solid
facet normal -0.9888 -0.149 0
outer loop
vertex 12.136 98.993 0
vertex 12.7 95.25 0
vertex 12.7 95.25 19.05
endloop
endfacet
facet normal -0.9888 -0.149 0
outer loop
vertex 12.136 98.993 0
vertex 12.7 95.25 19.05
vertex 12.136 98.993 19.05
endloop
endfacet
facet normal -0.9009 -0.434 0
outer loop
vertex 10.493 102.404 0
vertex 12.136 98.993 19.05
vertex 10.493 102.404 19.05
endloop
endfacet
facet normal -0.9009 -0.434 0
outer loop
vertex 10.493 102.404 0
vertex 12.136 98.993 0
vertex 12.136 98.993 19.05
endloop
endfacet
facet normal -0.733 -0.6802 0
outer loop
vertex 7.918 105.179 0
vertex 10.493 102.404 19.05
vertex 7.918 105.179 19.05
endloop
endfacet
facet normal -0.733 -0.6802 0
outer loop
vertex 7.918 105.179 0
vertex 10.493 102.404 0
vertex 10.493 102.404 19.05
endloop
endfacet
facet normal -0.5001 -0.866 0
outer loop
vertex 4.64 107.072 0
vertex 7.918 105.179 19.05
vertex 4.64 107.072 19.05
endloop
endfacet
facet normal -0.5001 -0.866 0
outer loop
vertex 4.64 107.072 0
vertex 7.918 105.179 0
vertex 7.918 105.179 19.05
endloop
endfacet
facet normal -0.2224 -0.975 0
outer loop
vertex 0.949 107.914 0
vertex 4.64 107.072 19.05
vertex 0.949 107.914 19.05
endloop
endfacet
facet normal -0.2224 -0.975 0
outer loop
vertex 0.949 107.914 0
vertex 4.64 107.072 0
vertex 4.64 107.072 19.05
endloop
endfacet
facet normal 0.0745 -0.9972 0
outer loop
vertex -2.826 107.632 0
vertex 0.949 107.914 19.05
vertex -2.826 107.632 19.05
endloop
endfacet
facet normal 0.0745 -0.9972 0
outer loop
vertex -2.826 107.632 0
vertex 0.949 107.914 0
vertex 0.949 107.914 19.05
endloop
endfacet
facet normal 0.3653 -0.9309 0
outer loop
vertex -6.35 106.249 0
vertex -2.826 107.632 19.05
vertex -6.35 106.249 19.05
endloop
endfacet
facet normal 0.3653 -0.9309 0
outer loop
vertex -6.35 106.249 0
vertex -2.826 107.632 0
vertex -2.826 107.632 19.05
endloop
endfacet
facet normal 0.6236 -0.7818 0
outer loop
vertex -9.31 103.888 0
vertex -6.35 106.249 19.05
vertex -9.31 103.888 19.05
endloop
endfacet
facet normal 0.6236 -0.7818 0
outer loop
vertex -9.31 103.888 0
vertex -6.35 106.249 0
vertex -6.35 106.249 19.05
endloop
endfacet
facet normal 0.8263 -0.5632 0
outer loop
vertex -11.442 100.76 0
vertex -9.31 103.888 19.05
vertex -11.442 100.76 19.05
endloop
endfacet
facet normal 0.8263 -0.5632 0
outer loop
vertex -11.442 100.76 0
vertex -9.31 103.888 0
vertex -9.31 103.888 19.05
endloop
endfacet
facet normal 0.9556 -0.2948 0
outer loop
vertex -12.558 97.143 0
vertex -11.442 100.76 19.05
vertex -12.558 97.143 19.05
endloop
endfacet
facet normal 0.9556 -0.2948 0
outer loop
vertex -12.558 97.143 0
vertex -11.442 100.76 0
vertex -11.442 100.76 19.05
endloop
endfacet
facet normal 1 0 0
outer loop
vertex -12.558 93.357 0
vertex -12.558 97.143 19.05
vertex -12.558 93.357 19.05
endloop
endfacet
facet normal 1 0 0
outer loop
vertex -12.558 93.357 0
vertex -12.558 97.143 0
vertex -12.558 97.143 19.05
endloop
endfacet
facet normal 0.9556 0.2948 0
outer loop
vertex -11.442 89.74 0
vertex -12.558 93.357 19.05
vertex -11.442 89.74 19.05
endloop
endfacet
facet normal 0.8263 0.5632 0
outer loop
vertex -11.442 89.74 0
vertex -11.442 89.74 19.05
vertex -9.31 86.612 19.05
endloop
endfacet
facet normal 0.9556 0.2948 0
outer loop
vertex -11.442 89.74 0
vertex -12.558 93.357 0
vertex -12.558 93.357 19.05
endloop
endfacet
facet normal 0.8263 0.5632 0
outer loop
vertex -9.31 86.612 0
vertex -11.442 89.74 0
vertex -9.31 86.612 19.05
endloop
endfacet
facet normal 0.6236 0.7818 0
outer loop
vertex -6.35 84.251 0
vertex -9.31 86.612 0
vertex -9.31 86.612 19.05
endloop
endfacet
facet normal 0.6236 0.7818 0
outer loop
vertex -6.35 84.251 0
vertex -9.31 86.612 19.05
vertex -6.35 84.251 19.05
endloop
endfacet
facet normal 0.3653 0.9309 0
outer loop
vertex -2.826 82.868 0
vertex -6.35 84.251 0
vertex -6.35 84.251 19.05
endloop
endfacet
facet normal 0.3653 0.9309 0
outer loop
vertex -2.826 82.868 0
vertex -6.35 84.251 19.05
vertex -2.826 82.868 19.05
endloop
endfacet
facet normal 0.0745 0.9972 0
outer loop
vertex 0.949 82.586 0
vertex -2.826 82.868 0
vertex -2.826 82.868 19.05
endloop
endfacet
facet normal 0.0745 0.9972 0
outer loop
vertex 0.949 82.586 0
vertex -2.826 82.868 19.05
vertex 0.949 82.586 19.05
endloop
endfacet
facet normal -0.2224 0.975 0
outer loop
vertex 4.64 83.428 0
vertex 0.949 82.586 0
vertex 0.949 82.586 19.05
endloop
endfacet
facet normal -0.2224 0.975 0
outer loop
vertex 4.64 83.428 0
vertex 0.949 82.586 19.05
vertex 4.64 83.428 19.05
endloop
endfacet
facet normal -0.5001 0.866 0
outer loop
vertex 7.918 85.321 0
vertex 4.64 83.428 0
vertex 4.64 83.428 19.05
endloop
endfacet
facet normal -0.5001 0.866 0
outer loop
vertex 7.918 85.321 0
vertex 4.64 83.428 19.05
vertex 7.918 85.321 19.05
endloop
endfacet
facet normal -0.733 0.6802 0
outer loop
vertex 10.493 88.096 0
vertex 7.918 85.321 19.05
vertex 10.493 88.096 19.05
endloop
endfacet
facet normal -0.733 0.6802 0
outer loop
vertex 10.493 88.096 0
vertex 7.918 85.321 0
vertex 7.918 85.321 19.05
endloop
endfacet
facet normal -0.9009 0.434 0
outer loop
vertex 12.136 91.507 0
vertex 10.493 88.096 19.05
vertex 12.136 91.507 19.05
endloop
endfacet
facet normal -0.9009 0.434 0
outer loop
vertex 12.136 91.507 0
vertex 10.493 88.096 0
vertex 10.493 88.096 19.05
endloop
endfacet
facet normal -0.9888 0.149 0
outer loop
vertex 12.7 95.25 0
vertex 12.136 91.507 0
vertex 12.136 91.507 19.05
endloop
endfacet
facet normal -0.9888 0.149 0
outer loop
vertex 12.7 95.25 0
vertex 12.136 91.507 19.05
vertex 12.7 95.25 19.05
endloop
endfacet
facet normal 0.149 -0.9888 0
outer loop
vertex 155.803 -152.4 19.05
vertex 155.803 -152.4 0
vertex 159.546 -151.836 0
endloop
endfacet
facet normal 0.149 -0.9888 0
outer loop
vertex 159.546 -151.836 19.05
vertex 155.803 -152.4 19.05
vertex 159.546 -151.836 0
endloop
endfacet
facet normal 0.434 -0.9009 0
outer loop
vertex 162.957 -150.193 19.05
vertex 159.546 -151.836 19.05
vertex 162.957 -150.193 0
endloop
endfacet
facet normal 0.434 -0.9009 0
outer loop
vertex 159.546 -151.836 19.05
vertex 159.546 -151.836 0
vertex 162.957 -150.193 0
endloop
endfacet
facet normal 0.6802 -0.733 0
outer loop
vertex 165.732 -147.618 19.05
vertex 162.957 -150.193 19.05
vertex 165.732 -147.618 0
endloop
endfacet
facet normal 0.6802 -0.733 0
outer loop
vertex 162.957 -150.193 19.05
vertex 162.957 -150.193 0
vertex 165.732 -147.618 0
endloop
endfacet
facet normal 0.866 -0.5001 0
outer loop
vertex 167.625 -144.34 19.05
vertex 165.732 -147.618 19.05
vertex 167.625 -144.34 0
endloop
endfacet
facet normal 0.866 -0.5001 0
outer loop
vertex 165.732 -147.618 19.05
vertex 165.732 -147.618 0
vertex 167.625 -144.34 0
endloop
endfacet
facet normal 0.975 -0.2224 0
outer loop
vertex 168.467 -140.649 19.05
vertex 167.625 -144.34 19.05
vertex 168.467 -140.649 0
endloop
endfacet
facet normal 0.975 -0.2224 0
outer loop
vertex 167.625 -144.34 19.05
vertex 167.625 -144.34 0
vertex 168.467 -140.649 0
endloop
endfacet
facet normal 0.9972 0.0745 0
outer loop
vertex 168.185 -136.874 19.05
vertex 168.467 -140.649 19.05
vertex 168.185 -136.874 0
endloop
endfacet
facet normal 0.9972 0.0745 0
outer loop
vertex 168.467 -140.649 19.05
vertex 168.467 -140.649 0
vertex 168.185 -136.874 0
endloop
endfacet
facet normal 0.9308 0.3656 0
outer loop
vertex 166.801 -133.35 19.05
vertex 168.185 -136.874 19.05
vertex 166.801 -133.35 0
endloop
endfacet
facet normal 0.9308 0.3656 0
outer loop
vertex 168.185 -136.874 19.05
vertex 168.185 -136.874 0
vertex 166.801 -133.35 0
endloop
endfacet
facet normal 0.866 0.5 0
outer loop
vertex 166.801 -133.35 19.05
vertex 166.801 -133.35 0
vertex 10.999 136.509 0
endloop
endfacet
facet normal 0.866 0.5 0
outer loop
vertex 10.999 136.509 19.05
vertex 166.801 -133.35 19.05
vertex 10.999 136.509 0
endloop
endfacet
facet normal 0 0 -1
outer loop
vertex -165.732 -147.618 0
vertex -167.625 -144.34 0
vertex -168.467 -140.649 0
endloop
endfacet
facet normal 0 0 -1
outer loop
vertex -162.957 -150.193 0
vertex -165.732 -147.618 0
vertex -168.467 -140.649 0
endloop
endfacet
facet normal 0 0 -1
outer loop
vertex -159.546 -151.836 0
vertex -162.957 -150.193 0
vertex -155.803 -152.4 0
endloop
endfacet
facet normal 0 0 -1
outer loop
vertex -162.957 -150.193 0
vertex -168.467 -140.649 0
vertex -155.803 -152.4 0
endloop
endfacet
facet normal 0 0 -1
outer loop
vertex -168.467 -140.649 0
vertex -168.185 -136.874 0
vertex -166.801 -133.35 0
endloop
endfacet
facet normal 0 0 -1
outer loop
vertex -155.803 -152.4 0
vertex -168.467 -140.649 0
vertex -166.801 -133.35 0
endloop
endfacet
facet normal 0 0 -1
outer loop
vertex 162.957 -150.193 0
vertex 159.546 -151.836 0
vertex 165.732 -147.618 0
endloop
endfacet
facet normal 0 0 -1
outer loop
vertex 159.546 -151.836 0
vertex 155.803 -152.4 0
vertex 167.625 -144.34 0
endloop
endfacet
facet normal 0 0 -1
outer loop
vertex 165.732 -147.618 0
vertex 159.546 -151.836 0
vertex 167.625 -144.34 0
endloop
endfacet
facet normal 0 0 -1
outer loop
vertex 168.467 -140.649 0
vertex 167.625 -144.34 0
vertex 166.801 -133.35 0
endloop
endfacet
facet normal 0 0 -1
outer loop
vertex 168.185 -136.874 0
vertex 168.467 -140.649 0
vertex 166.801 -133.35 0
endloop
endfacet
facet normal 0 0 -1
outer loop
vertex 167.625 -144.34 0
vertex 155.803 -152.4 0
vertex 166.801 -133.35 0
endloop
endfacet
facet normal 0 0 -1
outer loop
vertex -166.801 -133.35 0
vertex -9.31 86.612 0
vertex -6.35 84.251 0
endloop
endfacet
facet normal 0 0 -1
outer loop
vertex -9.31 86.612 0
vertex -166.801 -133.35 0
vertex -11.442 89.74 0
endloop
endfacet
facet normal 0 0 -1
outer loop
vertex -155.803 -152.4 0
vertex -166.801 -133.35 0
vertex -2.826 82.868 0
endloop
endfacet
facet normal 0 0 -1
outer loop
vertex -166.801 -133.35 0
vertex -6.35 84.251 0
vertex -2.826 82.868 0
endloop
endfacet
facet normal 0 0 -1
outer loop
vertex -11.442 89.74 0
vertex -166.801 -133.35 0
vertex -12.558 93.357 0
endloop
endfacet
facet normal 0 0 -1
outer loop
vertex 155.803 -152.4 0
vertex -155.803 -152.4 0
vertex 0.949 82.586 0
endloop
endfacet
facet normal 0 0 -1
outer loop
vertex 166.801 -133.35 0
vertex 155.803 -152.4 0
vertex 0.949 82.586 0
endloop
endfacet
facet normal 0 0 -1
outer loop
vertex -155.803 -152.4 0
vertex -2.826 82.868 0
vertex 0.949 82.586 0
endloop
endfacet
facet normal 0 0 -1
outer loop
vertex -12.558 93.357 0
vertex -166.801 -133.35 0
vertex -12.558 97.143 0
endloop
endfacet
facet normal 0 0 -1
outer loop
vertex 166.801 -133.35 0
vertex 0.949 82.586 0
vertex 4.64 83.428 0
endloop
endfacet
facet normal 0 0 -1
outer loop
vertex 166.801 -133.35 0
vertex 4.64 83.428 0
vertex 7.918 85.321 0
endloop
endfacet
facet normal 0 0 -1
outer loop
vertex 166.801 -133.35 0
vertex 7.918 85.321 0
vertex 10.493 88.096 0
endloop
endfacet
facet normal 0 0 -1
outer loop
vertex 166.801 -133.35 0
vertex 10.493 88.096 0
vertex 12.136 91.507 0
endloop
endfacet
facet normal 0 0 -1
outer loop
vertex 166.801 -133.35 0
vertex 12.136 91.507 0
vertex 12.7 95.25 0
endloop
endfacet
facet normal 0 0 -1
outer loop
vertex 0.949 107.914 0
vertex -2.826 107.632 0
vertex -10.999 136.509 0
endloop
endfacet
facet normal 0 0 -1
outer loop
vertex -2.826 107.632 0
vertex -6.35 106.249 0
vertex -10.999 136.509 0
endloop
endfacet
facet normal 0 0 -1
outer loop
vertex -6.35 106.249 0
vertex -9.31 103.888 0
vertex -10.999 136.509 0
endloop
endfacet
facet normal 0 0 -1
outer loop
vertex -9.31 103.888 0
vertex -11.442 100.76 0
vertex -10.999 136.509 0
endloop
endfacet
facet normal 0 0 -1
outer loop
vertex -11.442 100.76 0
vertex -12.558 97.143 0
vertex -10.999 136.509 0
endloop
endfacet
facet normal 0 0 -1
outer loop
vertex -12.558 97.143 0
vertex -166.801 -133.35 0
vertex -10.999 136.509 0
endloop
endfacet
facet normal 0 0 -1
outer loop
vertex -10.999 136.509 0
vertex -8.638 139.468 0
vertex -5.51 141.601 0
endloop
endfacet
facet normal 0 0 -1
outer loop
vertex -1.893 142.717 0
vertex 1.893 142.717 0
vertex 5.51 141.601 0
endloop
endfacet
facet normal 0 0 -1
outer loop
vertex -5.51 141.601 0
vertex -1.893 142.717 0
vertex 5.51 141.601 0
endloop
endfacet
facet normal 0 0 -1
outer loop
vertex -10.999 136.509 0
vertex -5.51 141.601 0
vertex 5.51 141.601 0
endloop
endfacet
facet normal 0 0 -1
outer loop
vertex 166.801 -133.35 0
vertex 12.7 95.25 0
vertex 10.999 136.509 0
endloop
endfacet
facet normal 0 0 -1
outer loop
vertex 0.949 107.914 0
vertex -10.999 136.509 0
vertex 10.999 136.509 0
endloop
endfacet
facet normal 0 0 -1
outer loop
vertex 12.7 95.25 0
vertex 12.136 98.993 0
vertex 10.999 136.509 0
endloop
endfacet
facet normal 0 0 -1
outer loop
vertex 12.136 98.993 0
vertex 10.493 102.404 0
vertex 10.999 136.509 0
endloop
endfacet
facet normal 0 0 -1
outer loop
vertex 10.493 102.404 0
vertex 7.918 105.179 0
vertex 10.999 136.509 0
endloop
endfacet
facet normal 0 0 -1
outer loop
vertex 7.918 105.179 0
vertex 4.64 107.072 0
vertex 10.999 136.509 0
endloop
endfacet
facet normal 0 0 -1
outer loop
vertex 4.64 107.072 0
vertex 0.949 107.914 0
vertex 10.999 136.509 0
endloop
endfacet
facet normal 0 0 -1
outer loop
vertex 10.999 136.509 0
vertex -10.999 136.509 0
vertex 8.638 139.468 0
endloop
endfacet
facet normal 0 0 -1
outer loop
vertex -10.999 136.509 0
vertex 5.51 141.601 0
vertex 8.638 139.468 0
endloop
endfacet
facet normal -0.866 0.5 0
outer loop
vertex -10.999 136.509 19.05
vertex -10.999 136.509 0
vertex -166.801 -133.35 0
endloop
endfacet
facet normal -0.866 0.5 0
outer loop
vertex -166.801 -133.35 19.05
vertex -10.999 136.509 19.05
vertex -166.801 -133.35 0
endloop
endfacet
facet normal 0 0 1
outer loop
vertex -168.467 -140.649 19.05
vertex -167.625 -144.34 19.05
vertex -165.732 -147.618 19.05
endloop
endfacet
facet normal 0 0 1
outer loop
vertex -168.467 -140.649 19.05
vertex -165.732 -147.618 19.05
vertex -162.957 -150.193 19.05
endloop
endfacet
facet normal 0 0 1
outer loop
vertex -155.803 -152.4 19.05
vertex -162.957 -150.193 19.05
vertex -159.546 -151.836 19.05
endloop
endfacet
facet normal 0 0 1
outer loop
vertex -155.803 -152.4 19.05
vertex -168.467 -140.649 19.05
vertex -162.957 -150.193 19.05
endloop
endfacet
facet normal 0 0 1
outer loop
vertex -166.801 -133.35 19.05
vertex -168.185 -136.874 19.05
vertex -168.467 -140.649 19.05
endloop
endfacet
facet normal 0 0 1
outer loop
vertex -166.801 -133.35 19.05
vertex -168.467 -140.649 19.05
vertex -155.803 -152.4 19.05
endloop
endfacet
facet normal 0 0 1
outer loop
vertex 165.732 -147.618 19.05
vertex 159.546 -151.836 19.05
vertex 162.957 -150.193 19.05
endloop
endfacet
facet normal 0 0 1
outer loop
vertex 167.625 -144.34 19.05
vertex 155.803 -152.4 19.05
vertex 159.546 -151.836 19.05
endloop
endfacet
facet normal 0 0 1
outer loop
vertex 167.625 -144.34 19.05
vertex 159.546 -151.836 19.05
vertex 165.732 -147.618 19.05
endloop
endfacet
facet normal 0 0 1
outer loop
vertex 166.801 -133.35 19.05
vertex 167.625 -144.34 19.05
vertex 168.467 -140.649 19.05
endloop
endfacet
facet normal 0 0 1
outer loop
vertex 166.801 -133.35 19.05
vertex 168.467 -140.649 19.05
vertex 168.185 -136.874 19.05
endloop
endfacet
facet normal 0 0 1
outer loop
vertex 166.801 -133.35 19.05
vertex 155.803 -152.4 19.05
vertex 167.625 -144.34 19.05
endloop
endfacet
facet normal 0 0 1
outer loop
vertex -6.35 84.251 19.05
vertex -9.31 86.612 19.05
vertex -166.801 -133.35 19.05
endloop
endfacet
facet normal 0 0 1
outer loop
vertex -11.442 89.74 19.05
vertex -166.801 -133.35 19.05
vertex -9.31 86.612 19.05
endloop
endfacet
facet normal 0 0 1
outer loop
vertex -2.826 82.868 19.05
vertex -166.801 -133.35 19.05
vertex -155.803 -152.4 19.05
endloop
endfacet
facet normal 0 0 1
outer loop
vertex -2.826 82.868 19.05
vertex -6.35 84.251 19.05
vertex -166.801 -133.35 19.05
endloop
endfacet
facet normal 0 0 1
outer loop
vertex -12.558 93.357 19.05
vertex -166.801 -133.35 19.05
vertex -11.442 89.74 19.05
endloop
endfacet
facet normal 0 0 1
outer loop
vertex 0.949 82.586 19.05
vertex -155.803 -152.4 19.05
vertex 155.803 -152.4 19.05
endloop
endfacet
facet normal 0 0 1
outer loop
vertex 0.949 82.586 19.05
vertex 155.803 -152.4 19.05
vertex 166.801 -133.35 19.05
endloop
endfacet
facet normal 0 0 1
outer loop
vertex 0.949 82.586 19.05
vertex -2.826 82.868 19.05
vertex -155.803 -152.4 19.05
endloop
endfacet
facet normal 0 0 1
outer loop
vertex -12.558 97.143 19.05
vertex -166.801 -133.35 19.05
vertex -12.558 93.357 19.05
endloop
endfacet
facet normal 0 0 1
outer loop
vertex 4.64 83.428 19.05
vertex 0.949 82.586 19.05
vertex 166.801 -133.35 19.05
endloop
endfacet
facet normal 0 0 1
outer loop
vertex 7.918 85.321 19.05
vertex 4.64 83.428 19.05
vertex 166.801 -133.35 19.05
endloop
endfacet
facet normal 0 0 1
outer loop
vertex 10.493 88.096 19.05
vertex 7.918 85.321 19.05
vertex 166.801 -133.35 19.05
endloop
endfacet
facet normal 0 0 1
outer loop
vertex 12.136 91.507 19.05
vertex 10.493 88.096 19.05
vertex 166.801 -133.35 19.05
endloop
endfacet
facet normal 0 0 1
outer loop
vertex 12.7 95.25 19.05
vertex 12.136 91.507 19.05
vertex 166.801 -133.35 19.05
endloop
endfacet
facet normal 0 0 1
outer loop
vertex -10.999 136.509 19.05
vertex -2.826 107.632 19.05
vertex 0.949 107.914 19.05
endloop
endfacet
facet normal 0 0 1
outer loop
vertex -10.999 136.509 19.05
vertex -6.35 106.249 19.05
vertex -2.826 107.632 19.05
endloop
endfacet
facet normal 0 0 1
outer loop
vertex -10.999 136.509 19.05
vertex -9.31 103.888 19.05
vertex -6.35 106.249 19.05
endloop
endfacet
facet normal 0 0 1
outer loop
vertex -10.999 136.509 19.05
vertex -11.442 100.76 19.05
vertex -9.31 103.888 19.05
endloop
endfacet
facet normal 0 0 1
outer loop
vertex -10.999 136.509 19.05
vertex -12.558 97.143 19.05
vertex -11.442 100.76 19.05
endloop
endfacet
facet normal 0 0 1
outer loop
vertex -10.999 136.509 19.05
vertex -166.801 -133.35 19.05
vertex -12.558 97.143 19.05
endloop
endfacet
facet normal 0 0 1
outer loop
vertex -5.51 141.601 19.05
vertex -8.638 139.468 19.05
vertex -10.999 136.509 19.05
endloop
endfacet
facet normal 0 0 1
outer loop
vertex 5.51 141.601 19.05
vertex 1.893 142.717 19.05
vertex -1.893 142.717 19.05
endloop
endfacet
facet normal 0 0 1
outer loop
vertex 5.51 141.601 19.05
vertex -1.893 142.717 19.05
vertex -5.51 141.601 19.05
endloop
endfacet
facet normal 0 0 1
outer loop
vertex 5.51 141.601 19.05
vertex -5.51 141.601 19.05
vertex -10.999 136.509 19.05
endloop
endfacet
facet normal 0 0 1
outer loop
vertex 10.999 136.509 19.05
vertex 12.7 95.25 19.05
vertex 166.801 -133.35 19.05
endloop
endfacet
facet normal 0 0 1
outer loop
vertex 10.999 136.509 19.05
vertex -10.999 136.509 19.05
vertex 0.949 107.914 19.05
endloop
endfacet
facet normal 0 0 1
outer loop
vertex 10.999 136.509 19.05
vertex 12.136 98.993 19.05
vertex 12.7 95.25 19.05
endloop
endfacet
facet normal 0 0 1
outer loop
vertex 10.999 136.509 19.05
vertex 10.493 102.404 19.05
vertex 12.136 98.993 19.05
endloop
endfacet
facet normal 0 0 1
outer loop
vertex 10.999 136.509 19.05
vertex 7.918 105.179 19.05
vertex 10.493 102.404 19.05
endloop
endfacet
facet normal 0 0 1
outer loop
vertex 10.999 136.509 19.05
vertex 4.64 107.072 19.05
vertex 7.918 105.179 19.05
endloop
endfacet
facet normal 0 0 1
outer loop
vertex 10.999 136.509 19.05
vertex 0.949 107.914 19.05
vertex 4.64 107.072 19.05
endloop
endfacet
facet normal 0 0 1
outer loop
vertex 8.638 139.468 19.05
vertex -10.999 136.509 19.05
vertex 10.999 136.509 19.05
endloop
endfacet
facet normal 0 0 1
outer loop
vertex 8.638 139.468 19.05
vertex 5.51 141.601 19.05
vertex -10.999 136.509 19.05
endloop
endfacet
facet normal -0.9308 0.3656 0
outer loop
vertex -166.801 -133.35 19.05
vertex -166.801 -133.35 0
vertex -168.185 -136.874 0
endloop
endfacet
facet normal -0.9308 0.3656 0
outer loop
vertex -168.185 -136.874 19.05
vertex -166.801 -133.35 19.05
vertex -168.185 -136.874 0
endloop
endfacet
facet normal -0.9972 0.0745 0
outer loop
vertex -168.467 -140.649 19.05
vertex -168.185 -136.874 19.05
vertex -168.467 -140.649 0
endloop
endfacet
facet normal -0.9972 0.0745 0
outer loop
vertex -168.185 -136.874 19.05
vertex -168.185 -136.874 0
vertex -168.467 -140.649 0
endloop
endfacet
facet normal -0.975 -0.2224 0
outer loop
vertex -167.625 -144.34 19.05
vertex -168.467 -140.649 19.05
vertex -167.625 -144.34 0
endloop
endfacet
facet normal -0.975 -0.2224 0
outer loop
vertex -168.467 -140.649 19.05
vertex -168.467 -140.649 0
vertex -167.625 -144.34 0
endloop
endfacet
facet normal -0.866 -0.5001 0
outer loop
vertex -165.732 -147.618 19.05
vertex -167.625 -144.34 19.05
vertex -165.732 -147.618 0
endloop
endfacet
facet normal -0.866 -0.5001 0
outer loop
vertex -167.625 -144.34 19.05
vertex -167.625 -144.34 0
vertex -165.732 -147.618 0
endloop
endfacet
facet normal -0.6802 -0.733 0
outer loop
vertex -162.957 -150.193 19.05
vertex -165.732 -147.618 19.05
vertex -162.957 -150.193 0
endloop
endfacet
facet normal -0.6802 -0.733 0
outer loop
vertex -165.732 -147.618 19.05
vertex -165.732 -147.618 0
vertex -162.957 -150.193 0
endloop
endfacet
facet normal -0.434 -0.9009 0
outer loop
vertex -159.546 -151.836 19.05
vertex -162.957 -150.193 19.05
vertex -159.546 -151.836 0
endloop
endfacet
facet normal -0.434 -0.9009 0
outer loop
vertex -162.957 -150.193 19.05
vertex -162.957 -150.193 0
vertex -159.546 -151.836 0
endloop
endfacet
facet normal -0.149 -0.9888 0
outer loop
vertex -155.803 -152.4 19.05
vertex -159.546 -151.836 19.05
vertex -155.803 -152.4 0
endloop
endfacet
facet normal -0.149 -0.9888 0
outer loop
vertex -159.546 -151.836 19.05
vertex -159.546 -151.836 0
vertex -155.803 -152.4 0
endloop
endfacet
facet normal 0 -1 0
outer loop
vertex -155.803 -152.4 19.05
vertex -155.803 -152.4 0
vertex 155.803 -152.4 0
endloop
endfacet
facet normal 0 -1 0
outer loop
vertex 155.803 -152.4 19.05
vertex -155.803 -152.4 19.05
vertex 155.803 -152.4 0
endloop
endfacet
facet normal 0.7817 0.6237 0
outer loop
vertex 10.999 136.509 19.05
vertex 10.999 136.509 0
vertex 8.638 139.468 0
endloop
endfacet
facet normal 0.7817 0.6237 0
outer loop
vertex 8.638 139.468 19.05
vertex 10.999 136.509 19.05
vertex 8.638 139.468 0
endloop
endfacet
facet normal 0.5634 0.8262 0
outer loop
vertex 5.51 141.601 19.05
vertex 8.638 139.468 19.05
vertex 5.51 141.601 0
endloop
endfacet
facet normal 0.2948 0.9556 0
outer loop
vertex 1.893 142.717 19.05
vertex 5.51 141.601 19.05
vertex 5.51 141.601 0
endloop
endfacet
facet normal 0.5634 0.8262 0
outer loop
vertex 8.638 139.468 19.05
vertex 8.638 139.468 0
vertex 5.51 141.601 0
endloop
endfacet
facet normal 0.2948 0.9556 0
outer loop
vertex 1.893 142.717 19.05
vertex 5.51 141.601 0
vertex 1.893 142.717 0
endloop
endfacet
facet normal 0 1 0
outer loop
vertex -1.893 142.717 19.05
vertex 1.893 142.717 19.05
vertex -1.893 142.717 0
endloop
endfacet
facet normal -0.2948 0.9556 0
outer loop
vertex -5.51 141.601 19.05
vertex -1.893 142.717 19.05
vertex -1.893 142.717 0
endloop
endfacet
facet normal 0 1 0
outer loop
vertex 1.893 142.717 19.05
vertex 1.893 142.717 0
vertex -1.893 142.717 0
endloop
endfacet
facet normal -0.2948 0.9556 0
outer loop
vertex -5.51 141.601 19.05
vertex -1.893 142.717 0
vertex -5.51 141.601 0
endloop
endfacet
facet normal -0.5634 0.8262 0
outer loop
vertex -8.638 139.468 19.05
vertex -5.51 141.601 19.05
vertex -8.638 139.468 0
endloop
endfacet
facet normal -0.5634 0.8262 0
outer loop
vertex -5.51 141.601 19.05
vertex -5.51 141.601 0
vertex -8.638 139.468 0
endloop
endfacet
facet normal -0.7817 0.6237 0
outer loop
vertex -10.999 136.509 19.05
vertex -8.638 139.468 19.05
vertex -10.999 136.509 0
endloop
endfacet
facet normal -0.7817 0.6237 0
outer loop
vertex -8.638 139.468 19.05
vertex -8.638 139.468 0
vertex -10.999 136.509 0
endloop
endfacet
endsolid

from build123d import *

# Parameters (mm, degrees)
F0_R     = 12.7
F1_DEPTH = 19.05


with BuildPart() as f1:
    # F0 (on Top) → F1 (new body)
    with BuildSketch(Plane.XY):
        with BuildLine():
            ThreePointArc((-166.801477, -133.35), (-166.801477, -146.05), (-155.802955, -152.4))
            Line((-155.802955, -152.4), (155.802955, -152.4))
            ThreePointArc((155.802955, -152.4), (166.801477, -146.05), (166.801477, -133.35))
            Line((166.801477, -133.35), (10.998523, 136.508634))
            ThreePointArc((10.998523, 136.508634), (0, 142.858634), (-10.998523, 136.508634))
            Line((-10.998523, 136.508634), (-166.801477, -133.35))
        make_face()
        with Locations((0, 95.25)):
            Circle(F0_R, mode=Mode.SUBTRACT)
    extrude(amount=F1_DEPTH)


solid = f1.part
